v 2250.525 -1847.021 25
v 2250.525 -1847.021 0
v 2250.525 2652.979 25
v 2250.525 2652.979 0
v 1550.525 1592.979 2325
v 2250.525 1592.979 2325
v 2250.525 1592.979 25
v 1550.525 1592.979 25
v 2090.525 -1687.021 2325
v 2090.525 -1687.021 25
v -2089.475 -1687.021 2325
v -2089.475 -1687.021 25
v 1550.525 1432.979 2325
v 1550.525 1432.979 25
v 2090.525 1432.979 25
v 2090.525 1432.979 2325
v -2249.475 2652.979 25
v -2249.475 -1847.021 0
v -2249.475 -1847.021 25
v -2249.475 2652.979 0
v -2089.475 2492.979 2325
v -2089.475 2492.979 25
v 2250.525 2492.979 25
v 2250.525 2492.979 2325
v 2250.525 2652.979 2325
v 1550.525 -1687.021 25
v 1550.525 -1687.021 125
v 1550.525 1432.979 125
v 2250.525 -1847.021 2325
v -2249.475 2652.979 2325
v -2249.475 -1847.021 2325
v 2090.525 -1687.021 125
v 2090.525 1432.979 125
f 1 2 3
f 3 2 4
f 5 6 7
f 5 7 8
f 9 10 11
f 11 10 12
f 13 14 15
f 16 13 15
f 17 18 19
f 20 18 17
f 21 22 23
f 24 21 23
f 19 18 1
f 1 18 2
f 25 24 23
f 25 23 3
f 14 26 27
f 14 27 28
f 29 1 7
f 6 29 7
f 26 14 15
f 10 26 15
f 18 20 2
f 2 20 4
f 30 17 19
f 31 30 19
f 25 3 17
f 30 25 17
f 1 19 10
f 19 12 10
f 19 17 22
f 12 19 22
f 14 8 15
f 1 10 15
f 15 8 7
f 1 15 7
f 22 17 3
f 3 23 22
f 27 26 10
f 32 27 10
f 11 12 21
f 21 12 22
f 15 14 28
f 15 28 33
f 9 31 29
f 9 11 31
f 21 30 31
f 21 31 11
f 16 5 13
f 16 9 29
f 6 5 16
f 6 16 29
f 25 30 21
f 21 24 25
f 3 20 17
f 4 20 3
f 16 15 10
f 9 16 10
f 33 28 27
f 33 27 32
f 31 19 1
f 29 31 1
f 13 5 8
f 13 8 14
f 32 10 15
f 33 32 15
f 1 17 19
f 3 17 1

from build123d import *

# Parameters (mm, degrees)
F0_W     = 4500
F0_H     = 4500
F1_DEPTH = 25
F3_DEPTH = 2300
F4_W     = 540
F4_H     = 3120
F5_DEPTH = 100


with BuildPart() as f1:
    # F0 (on Top) → F1 (new body)
    with BuildSketch(Plane.XY):
        with Locations((0.524938, 402.978641)):
            Rectangle(F0_W, F0_H)
    extrude(amount=F1_DEPTH)


with BuildPart() as f3:
    # F2 (on face) → F3 (new body)
    with BuildSketch(Plane.XY.offset(25)):
        Polygon((2250.524938, 2492.978641), (2250.524938, 2652.978641), (-2249.475062, 2652.978641), (-2249.475062, -1847.021359), (2250.524938, -1847.021359), (2250.524938, 1592.978641), (1550.524938, 1592.978641), (1550.524938, 1432.978641), (2090.524938, 1432.978641), (2090.524938, -1687.021359), (-2089.475062, -1687.021359), (-2089.475062, 2492.978641), align=None)
    extrude(amount=F3_DEPTH)


with BuildPart() as f5:
    # F4 (on face) → F5 (new body)
    with BuildSketch(Plane.XY.offset(25)):
        with Locations((1820.524938, -127.021359)):
            Rectangle(F4_W, F4_H)
    extrude(amount=F5_DEPTH)


solid = Compound([f1.part, f3.part, f5.part])
